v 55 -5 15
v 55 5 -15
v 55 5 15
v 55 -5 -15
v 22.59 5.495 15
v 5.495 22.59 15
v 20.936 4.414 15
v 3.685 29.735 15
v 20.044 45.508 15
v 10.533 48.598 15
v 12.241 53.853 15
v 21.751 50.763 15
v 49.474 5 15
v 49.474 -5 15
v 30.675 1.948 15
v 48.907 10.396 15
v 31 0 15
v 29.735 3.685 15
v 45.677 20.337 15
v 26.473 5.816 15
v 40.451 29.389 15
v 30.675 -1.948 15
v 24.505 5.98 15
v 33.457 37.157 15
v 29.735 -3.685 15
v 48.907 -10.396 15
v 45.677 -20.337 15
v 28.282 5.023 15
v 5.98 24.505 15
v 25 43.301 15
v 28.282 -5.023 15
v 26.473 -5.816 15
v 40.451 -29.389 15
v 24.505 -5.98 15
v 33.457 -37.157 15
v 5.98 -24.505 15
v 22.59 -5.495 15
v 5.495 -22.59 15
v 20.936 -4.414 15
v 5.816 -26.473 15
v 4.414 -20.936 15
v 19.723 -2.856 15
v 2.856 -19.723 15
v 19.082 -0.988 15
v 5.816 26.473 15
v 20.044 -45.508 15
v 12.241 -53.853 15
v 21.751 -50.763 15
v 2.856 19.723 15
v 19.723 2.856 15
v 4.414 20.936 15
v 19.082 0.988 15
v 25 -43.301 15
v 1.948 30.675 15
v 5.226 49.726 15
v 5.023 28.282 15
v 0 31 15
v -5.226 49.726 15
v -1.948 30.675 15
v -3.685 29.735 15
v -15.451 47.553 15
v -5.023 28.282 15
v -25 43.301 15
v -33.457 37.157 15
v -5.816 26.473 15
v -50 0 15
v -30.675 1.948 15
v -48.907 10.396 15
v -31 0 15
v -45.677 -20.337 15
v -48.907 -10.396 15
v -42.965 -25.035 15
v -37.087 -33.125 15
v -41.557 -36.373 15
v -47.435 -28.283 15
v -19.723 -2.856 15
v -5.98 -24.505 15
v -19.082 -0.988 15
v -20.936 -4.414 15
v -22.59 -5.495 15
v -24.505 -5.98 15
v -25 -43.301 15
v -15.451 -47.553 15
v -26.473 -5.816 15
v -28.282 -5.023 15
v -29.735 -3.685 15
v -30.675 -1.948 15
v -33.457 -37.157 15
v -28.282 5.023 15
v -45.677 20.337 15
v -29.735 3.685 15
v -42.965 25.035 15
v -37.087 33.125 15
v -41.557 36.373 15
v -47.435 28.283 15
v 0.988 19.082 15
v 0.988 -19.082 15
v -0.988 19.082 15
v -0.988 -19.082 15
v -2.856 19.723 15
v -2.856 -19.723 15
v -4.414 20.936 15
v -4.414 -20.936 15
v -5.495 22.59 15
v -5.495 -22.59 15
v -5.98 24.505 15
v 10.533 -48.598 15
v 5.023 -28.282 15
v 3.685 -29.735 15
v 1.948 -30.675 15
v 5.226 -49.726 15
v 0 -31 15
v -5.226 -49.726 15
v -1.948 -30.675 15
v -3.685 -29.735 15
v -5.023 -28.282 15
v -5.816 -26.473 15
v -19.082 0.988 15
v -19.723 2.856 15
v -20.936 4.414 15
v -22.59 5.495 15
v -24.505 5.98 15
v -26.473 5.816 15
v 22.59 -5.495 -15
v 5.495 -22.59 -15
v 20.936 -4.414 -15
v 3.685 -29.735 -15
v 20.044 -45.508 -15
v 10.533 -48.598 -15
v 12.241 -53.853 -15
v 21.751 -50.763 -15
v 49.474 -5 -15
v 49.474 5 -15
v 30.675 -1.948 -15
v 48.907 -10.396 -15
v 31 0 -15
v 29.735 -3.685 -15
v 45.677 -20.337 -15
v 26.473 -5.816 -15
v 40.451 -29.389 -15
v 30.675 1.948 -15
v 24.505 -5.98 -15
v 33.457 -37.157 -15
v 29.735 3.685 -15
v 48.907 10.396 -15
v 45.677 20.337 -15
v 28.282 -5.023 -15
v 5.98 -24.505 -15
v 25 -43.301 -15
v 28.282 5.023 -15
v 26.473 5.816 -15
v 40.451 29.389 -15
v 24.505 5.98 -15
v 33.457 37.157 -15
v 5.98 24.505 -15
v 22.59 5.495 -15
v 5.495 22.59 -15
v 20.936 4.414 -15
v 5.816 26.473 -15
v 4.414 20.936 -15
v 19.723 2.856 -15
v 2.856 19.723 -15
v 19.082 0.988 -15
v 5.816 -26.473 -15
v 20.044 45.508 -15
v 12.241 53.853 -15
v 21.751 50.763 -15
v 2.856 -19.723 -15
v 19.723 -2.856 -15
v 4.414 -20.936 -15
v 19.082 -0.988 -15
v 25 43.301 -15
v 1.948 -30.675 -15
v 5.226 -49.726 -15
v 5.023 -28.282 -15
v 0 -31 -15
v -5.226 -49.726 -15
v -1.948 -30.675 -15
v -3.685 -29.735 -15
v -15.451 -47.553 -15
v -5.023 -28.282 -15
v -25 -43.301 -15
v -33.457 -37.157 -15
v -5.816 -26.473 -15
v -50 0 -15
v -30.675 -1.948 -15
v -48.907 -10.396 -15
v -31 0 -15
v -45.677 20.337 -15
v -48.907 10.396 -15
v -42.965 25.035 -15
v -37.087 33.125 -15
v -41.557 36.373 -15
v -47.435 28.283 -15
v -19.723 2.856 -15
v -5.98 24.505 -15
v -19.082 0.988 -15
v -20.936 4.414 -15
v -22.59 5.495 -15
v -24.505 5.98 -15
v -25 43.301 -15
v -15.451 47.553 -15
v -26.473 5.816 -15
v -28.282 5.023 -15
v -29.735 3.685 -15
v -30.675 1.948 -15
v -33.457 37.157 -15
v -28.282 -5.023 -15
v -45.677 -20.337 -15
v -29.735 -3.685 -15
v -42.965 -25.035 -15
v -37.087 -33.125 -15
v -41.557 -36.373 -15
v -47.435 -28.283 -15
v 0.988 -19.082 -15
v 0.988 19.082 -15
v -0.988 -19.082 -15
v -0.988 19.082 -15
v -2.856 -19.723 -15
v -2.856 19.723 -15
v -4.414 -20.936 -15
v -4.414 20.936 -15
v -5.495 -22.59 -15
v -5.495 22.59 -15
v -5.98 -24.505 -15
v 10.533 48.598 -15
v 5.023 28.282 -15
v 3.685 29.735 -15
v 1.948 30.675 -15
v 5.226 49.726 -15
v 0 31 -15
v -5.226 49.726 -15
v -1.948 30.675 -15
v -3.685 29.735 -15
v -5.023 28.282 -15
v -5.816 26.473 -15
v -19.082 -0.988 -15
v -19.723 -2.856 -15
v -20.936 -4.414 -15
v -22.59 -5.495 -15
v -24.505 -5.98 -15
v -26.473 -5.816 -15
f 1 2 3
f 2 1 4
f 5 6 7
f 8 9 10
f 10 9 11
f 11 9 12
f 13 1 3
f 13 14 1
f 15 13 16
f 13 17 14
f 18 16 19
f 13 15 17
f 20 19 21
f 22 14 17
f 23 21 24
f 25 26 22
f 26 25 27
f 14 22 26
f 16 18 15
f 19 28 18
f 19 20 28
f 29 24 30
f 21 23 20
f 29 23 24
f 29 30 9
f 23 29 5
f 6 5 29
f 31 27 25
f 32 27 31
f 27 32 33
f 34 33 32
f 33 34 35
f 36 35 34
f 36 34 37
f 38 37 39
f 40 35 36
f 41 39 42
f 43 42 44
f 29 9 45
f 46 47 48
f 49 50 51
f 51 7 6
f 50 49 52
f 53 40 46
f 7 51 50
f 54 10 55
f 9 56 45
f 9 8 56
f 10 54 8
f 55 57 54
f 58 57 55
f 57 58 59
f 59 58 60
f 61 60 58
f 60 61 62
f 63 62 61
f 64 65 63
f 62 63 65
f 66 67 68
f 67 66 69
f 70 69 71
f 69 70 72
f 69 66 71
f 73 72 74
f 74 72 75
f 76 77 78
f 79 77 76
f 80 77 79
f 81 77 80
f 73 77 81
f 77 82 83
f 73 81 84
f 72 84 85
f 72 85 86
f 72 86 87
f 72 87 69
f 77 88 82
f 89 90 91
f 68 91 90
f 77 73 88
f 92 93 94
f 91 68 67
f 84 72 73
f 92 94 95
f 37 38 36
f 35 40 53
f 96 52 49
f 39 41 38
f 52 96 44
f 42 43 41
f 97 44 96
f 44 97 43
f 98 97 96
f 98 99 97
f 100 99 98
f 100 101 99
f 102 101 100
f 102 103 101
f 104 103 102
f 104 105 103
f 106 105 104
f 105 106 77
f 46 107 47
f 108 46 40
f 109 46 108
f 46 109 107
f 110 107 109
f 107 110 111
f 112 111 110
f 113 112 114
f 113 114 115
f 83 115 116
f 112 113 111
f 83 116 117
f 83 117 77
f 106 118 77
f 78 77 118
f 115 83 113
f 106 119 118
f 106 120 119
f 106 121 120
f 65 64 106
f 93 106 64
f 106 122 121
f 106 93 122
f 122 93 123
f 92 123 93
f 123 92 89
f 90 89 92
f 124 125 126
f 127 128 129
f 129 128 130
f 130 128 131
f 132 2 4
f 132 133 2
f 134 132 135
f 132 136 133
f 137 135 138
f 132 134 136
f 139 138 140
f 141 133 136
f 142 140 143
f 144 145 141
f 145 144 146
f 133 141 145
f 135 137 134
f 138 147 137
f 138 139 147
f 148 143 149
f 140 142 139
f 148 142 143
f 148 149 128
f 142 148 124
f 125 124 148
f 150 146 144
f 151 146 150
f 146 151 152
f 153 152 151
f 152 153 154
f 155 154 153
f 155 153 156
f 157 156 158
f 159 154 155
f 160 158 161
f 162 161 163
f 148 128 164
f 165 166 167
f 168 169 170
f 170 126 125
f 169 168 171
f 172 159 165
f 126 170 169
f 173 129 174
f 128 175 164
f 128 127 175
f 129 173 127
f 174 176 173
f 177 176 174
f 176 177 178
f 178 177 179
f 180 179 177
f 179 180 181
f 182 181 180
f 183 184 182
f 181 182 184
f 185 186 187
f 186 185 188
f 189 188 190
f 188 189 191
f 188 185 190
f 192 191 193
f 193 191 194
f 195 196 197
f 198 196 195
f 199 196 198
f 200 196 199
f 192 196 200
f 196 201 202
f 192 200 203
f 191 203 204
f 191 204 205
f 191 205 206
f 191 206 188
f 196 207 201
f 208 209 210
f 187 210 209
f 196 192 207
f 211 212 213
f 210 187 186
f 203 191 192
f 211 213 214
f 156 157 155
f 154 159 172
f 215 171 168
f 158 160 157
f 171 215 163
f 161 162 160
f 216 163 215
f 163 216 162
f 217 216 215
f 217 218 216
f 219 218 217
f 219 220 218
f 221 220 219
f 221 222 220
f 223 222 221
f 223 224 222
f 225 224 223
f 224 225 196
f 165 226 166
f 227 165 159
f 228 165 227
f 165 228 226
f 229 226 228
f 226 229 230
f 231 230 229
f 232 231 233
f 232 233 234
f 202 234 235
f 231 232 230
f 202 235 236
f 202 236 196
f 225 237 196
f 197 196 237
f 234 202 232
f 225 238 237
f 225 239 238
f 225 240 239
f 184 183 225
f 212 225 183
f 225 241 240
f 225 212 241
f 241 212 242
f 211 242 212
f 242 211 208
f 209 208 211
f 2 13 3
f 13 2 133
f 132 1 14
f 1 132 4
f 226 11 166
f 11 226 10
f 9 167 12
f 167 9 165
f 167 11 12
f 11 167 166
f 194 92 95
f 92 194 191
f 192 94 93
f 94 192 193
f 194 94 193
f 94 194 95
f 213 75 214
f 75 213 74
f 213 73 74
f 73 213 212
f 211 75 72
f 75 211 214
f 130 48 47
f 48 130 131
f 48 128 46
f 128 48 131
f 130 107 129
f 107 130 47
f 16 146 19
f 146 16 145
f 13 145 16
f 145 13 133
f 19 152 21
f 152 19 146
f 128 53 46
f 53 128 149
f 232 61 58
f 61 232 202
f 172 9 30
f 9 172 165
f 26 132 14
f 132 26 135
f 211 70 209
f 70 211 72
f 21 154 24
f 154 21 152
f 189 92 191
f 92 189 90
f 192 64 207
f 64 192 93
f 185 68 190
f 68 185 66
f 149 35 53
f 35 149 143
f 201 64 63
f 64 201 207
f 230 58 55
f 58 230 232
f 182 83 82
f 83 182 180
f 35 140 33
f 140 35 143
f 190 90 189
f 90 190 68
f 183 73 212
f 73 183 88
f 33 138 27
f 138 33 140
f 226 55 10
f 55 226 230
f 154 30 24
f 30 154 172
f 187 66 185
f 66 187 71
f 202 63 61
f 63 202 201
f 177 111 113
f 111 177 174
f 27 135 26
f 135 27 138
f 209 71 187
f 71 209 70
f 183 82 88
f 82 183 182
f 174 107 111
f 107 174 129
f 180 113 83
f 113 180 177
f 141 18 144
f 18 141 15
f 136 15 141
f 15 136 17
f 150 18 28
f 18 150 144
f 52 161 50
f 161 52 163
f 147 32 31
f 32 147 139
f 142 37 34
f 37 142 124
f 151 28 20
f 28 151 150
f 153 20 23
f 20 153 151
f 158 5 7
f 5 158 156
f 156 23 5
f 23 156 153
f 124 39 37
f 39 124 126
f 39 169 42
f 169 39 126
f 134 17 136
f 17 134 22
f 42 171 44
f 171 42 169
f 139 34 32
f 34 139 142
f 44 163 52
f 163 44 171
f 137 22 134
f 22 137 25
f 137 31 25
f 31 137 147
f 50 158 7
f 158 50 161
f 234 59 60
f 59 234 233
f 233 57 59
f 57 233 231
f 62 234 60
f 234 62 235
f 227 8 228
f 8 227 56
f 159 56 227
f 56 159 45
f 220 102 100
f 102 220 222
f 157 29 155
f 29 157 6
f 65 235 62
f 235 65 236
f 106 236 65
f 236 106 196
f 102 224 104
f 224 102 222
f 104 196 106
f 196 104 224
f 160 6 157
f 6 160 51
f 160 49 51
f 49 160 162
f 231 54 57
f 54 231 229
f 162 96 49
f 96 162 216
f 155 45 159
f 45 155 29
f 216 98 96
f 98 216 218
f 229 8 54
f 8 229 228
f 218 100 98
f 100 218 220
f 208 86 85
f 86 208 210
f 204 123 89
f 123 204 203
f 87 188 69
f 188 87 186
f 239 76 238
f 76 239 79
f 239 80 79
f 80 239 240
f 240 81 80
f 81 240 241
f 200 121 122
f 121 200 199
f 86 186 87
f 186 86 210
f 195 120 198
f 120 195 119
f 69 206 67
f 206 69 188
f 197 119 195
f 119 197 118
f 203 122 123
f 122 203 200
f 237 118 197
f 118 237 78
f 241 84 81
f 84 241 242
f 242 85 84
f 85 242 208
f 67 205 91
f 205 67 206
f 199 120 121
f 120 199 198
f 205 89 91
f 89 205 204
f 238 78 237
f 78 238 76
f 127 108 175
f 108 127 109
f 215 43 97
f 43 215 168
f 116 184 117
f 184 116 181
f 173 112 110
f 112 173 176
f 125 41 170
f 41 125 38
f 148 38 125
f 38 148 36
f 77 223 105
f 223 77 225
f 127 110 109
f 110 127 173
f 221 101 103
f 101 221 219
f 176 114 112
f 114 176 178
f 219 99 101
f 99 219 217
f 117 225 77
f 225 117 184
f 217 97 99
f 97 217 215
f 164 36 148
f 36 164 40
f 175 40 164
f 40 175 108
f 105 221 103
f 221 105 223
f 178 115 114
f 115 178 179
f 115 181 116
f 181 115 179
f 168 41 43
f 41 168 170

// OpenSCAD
// globals
co_radius = 50;
co_height = 30;

module complexObject()
{
	difference()
	{
		union()
		{
			cylinder(r=co_radius, h=co_height, center = true);

			for(r=[0:5])
			{
				rotate([0,0,r*360/5]) translate([co_radius, 0, 0]) cube([10,10,co_height], center=true);
			}
		}


		union()
		{
			for(r=[0:4])
			{
				rotate([0,0,r*360/4]) translate([co_radius/2, 0, 0]) cylinder(r=6, h=co_height*1.1, center=true);
			}
		}
	}
}


complexObject();
